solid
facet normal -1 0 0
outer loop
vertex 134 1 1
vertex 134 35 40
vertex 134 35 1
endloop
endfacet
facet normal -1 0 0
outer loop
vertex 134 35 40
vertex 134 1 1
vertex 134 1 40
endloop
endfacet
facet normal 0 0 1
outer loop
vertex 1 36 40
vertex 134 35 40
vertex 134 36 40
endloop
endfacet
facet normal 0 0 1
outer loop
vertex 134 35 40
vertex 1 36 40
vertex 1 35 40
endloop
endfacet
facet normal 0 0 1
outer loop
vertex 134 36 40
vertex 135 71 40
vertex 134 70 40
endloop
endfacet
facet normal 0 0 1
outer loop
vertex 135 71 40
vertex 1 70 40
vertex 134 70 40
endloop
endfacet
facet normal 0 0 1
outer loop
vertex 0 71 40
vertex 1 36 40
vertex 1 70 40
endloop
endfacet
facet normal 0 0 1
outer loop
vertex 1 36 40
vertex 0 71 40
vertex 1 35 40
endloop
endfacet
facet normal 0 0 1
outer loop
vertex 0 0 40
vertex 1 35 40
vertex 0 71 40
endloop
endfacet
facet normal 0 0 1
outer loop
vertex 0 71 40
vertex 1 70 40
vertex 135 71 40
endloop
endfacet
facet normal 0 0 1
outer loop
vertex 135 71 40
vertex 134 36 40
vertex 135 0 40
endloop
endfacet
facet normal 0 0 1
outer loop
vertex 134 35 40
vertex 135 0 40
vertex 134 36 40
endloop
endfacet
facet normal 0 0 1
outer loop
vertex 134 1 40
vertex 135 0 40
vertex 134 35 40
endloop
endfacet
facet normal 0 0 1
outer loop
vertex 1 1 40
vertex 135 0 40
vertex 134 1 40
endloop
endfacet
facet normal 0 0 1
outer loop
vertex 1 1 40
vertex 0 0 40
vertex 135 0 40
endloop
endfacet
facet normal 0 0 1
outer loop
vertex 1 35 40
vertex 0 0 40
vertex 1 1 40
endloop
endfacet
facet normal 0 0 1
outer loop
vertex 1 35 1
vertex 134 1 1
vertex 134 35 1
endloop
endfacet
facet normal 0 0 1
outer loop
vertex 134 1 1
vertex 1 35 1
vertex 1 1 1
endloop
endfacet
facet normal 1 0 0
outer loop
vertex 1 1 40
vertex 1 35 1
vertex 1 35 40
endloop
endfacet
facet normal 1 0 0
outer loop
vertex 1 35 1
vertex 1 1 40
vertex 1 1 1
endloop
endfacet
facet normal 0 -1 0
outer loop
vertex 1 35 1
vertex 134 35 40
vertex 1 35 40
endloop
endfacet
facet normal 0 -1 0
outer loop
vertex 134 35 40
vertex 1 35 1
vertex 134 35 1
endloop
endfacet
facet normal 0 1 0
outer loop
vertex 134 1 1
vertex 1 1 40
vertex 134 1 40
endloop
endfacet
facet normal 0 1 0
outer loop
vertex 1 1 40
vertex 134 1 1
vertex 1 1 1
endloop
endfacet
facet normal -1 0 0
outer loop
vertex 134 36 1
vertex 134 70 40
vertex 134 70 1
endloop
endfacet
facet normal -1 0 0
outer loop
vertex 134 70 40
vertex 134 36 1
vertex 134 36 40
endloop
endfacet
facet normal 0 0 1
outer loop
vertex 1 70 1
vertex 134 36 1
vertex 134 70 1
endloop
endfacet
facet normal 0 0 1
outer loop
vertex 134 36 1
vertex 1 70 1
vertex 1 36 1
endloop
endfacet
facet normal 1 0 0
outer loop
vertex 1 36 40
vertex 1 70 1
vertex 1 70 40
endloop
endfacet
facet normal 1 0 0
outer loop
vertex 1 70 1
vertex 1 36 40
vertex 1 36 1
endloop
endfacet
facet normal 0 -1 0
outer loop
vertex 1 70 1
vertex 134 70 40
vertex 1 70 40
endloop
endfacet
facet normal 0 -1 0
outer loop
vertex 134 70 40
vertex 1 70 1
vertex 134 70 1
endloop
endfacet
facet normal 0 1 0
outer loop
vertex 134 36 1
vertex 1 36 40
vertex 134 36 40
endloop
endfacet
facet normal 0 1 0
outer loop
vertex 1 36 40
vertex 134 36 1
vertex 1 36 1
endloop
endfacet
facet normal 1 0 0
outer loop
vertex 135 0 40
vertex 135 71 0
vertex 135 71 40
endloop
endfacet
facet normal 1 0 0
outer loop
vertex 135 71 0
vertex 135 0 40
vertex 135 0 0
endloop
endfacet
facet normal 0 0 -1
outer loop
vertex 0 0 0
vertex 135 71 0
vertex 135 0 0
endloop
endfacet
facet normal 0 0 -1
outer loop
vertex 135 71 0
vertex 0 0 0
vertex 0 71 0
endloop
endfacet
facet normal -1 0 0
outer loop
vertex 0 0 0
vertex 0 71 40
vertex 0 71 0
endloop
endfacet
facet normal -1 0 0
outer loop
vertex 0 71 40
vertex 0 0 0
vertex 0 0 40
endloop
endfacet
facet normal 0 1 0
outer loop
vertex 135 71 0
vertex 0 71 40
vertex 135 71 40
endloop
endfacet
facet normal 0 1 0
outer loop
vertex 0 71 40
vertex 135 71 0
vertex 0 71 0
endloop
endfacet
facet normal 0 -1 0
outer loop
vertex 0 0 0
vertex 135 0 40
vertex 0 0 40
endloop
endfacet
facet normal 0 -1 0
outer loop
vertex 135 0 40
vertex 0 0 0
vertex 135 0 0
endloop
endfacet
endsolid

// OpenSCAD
// wipes
// N=4;
// SZ=25;
// WW=55;
// HH=30;

// screenkleen
N=2;
SZ=35;
WW=135;
HH=40;

THICKNESS=1;
difference() {
    cube([WW, SZ*N+1, HH]);
    for (i = [0:N-1]) {
        translate([THICKNESS, SZ*i+THICKNESS, THICKNESS])
            cube([WW-(THICKNESS*2), SZ-(THICKNESS*2-1), HH-THICKNESS]);
    }
}
